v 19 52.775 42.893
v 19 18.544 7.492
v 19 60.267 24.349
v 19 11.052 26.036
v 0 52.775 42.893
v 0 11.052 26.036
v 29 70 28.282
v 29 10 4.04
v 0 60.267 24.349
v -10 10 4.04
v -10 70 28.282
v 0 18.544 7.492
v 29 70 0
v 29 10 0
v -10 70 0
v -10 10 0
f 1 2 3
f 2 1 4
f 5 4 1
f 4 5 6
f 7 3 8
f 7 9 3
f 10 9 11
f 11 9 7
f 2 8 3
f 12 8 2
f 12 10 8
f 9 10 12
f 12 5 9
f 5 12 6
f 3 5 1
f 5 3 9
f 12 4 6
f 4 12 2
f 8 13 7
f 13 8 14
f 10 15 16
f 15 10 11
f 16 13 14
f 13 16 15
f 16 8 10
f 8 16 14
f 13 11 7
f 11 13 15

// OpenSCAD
module patas(x,y,angulo){
    difference(){
        rotate([angulo,0,0]) translate([0,20,0]){
            cube([x,y,20]);
            translate([-10,-20,-80]) cube([x + 2 * 10, y + 2*20,80]);
        }
        translate([-50,-200,-100]) cube([100, 400,100]);
        translate([-50,0,-90]) cube([100, 10,100]);
        translate([-50,70,-20]) cube([100, 50,100]);
    }
}

// patas(19,47,22);
// patas(18,36,12);
patas(19,45,22);
